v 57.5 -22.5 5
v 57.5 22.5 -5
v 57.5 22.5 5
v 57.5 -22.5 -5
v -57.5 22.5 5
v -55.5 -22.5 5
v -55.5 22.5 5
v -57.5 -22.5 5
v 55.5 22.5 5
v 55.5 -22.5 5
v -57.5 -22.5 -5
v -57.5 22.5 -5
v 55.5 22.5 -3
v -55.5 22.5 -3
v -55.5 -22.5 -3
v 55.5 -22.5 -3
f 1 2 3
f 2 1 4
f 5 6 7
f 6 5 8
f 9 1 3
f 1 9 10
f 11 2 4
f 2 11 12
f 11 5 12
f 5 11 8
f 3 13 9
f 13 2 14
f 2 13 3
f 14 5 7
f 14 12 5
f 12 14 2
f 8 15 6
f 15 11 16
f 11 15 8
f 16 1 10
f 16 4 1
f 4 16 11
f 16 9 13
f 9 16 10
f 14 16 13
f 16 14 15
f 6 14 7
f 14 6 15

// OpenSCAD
width=111;
depth=45;
height=10;
border_size=2;


difference() {
    cube([width+(border_size*2), depth, height], center=true);
    translate([0,0,border_size])
    cube([width, depth+1, height], center=true);
}
